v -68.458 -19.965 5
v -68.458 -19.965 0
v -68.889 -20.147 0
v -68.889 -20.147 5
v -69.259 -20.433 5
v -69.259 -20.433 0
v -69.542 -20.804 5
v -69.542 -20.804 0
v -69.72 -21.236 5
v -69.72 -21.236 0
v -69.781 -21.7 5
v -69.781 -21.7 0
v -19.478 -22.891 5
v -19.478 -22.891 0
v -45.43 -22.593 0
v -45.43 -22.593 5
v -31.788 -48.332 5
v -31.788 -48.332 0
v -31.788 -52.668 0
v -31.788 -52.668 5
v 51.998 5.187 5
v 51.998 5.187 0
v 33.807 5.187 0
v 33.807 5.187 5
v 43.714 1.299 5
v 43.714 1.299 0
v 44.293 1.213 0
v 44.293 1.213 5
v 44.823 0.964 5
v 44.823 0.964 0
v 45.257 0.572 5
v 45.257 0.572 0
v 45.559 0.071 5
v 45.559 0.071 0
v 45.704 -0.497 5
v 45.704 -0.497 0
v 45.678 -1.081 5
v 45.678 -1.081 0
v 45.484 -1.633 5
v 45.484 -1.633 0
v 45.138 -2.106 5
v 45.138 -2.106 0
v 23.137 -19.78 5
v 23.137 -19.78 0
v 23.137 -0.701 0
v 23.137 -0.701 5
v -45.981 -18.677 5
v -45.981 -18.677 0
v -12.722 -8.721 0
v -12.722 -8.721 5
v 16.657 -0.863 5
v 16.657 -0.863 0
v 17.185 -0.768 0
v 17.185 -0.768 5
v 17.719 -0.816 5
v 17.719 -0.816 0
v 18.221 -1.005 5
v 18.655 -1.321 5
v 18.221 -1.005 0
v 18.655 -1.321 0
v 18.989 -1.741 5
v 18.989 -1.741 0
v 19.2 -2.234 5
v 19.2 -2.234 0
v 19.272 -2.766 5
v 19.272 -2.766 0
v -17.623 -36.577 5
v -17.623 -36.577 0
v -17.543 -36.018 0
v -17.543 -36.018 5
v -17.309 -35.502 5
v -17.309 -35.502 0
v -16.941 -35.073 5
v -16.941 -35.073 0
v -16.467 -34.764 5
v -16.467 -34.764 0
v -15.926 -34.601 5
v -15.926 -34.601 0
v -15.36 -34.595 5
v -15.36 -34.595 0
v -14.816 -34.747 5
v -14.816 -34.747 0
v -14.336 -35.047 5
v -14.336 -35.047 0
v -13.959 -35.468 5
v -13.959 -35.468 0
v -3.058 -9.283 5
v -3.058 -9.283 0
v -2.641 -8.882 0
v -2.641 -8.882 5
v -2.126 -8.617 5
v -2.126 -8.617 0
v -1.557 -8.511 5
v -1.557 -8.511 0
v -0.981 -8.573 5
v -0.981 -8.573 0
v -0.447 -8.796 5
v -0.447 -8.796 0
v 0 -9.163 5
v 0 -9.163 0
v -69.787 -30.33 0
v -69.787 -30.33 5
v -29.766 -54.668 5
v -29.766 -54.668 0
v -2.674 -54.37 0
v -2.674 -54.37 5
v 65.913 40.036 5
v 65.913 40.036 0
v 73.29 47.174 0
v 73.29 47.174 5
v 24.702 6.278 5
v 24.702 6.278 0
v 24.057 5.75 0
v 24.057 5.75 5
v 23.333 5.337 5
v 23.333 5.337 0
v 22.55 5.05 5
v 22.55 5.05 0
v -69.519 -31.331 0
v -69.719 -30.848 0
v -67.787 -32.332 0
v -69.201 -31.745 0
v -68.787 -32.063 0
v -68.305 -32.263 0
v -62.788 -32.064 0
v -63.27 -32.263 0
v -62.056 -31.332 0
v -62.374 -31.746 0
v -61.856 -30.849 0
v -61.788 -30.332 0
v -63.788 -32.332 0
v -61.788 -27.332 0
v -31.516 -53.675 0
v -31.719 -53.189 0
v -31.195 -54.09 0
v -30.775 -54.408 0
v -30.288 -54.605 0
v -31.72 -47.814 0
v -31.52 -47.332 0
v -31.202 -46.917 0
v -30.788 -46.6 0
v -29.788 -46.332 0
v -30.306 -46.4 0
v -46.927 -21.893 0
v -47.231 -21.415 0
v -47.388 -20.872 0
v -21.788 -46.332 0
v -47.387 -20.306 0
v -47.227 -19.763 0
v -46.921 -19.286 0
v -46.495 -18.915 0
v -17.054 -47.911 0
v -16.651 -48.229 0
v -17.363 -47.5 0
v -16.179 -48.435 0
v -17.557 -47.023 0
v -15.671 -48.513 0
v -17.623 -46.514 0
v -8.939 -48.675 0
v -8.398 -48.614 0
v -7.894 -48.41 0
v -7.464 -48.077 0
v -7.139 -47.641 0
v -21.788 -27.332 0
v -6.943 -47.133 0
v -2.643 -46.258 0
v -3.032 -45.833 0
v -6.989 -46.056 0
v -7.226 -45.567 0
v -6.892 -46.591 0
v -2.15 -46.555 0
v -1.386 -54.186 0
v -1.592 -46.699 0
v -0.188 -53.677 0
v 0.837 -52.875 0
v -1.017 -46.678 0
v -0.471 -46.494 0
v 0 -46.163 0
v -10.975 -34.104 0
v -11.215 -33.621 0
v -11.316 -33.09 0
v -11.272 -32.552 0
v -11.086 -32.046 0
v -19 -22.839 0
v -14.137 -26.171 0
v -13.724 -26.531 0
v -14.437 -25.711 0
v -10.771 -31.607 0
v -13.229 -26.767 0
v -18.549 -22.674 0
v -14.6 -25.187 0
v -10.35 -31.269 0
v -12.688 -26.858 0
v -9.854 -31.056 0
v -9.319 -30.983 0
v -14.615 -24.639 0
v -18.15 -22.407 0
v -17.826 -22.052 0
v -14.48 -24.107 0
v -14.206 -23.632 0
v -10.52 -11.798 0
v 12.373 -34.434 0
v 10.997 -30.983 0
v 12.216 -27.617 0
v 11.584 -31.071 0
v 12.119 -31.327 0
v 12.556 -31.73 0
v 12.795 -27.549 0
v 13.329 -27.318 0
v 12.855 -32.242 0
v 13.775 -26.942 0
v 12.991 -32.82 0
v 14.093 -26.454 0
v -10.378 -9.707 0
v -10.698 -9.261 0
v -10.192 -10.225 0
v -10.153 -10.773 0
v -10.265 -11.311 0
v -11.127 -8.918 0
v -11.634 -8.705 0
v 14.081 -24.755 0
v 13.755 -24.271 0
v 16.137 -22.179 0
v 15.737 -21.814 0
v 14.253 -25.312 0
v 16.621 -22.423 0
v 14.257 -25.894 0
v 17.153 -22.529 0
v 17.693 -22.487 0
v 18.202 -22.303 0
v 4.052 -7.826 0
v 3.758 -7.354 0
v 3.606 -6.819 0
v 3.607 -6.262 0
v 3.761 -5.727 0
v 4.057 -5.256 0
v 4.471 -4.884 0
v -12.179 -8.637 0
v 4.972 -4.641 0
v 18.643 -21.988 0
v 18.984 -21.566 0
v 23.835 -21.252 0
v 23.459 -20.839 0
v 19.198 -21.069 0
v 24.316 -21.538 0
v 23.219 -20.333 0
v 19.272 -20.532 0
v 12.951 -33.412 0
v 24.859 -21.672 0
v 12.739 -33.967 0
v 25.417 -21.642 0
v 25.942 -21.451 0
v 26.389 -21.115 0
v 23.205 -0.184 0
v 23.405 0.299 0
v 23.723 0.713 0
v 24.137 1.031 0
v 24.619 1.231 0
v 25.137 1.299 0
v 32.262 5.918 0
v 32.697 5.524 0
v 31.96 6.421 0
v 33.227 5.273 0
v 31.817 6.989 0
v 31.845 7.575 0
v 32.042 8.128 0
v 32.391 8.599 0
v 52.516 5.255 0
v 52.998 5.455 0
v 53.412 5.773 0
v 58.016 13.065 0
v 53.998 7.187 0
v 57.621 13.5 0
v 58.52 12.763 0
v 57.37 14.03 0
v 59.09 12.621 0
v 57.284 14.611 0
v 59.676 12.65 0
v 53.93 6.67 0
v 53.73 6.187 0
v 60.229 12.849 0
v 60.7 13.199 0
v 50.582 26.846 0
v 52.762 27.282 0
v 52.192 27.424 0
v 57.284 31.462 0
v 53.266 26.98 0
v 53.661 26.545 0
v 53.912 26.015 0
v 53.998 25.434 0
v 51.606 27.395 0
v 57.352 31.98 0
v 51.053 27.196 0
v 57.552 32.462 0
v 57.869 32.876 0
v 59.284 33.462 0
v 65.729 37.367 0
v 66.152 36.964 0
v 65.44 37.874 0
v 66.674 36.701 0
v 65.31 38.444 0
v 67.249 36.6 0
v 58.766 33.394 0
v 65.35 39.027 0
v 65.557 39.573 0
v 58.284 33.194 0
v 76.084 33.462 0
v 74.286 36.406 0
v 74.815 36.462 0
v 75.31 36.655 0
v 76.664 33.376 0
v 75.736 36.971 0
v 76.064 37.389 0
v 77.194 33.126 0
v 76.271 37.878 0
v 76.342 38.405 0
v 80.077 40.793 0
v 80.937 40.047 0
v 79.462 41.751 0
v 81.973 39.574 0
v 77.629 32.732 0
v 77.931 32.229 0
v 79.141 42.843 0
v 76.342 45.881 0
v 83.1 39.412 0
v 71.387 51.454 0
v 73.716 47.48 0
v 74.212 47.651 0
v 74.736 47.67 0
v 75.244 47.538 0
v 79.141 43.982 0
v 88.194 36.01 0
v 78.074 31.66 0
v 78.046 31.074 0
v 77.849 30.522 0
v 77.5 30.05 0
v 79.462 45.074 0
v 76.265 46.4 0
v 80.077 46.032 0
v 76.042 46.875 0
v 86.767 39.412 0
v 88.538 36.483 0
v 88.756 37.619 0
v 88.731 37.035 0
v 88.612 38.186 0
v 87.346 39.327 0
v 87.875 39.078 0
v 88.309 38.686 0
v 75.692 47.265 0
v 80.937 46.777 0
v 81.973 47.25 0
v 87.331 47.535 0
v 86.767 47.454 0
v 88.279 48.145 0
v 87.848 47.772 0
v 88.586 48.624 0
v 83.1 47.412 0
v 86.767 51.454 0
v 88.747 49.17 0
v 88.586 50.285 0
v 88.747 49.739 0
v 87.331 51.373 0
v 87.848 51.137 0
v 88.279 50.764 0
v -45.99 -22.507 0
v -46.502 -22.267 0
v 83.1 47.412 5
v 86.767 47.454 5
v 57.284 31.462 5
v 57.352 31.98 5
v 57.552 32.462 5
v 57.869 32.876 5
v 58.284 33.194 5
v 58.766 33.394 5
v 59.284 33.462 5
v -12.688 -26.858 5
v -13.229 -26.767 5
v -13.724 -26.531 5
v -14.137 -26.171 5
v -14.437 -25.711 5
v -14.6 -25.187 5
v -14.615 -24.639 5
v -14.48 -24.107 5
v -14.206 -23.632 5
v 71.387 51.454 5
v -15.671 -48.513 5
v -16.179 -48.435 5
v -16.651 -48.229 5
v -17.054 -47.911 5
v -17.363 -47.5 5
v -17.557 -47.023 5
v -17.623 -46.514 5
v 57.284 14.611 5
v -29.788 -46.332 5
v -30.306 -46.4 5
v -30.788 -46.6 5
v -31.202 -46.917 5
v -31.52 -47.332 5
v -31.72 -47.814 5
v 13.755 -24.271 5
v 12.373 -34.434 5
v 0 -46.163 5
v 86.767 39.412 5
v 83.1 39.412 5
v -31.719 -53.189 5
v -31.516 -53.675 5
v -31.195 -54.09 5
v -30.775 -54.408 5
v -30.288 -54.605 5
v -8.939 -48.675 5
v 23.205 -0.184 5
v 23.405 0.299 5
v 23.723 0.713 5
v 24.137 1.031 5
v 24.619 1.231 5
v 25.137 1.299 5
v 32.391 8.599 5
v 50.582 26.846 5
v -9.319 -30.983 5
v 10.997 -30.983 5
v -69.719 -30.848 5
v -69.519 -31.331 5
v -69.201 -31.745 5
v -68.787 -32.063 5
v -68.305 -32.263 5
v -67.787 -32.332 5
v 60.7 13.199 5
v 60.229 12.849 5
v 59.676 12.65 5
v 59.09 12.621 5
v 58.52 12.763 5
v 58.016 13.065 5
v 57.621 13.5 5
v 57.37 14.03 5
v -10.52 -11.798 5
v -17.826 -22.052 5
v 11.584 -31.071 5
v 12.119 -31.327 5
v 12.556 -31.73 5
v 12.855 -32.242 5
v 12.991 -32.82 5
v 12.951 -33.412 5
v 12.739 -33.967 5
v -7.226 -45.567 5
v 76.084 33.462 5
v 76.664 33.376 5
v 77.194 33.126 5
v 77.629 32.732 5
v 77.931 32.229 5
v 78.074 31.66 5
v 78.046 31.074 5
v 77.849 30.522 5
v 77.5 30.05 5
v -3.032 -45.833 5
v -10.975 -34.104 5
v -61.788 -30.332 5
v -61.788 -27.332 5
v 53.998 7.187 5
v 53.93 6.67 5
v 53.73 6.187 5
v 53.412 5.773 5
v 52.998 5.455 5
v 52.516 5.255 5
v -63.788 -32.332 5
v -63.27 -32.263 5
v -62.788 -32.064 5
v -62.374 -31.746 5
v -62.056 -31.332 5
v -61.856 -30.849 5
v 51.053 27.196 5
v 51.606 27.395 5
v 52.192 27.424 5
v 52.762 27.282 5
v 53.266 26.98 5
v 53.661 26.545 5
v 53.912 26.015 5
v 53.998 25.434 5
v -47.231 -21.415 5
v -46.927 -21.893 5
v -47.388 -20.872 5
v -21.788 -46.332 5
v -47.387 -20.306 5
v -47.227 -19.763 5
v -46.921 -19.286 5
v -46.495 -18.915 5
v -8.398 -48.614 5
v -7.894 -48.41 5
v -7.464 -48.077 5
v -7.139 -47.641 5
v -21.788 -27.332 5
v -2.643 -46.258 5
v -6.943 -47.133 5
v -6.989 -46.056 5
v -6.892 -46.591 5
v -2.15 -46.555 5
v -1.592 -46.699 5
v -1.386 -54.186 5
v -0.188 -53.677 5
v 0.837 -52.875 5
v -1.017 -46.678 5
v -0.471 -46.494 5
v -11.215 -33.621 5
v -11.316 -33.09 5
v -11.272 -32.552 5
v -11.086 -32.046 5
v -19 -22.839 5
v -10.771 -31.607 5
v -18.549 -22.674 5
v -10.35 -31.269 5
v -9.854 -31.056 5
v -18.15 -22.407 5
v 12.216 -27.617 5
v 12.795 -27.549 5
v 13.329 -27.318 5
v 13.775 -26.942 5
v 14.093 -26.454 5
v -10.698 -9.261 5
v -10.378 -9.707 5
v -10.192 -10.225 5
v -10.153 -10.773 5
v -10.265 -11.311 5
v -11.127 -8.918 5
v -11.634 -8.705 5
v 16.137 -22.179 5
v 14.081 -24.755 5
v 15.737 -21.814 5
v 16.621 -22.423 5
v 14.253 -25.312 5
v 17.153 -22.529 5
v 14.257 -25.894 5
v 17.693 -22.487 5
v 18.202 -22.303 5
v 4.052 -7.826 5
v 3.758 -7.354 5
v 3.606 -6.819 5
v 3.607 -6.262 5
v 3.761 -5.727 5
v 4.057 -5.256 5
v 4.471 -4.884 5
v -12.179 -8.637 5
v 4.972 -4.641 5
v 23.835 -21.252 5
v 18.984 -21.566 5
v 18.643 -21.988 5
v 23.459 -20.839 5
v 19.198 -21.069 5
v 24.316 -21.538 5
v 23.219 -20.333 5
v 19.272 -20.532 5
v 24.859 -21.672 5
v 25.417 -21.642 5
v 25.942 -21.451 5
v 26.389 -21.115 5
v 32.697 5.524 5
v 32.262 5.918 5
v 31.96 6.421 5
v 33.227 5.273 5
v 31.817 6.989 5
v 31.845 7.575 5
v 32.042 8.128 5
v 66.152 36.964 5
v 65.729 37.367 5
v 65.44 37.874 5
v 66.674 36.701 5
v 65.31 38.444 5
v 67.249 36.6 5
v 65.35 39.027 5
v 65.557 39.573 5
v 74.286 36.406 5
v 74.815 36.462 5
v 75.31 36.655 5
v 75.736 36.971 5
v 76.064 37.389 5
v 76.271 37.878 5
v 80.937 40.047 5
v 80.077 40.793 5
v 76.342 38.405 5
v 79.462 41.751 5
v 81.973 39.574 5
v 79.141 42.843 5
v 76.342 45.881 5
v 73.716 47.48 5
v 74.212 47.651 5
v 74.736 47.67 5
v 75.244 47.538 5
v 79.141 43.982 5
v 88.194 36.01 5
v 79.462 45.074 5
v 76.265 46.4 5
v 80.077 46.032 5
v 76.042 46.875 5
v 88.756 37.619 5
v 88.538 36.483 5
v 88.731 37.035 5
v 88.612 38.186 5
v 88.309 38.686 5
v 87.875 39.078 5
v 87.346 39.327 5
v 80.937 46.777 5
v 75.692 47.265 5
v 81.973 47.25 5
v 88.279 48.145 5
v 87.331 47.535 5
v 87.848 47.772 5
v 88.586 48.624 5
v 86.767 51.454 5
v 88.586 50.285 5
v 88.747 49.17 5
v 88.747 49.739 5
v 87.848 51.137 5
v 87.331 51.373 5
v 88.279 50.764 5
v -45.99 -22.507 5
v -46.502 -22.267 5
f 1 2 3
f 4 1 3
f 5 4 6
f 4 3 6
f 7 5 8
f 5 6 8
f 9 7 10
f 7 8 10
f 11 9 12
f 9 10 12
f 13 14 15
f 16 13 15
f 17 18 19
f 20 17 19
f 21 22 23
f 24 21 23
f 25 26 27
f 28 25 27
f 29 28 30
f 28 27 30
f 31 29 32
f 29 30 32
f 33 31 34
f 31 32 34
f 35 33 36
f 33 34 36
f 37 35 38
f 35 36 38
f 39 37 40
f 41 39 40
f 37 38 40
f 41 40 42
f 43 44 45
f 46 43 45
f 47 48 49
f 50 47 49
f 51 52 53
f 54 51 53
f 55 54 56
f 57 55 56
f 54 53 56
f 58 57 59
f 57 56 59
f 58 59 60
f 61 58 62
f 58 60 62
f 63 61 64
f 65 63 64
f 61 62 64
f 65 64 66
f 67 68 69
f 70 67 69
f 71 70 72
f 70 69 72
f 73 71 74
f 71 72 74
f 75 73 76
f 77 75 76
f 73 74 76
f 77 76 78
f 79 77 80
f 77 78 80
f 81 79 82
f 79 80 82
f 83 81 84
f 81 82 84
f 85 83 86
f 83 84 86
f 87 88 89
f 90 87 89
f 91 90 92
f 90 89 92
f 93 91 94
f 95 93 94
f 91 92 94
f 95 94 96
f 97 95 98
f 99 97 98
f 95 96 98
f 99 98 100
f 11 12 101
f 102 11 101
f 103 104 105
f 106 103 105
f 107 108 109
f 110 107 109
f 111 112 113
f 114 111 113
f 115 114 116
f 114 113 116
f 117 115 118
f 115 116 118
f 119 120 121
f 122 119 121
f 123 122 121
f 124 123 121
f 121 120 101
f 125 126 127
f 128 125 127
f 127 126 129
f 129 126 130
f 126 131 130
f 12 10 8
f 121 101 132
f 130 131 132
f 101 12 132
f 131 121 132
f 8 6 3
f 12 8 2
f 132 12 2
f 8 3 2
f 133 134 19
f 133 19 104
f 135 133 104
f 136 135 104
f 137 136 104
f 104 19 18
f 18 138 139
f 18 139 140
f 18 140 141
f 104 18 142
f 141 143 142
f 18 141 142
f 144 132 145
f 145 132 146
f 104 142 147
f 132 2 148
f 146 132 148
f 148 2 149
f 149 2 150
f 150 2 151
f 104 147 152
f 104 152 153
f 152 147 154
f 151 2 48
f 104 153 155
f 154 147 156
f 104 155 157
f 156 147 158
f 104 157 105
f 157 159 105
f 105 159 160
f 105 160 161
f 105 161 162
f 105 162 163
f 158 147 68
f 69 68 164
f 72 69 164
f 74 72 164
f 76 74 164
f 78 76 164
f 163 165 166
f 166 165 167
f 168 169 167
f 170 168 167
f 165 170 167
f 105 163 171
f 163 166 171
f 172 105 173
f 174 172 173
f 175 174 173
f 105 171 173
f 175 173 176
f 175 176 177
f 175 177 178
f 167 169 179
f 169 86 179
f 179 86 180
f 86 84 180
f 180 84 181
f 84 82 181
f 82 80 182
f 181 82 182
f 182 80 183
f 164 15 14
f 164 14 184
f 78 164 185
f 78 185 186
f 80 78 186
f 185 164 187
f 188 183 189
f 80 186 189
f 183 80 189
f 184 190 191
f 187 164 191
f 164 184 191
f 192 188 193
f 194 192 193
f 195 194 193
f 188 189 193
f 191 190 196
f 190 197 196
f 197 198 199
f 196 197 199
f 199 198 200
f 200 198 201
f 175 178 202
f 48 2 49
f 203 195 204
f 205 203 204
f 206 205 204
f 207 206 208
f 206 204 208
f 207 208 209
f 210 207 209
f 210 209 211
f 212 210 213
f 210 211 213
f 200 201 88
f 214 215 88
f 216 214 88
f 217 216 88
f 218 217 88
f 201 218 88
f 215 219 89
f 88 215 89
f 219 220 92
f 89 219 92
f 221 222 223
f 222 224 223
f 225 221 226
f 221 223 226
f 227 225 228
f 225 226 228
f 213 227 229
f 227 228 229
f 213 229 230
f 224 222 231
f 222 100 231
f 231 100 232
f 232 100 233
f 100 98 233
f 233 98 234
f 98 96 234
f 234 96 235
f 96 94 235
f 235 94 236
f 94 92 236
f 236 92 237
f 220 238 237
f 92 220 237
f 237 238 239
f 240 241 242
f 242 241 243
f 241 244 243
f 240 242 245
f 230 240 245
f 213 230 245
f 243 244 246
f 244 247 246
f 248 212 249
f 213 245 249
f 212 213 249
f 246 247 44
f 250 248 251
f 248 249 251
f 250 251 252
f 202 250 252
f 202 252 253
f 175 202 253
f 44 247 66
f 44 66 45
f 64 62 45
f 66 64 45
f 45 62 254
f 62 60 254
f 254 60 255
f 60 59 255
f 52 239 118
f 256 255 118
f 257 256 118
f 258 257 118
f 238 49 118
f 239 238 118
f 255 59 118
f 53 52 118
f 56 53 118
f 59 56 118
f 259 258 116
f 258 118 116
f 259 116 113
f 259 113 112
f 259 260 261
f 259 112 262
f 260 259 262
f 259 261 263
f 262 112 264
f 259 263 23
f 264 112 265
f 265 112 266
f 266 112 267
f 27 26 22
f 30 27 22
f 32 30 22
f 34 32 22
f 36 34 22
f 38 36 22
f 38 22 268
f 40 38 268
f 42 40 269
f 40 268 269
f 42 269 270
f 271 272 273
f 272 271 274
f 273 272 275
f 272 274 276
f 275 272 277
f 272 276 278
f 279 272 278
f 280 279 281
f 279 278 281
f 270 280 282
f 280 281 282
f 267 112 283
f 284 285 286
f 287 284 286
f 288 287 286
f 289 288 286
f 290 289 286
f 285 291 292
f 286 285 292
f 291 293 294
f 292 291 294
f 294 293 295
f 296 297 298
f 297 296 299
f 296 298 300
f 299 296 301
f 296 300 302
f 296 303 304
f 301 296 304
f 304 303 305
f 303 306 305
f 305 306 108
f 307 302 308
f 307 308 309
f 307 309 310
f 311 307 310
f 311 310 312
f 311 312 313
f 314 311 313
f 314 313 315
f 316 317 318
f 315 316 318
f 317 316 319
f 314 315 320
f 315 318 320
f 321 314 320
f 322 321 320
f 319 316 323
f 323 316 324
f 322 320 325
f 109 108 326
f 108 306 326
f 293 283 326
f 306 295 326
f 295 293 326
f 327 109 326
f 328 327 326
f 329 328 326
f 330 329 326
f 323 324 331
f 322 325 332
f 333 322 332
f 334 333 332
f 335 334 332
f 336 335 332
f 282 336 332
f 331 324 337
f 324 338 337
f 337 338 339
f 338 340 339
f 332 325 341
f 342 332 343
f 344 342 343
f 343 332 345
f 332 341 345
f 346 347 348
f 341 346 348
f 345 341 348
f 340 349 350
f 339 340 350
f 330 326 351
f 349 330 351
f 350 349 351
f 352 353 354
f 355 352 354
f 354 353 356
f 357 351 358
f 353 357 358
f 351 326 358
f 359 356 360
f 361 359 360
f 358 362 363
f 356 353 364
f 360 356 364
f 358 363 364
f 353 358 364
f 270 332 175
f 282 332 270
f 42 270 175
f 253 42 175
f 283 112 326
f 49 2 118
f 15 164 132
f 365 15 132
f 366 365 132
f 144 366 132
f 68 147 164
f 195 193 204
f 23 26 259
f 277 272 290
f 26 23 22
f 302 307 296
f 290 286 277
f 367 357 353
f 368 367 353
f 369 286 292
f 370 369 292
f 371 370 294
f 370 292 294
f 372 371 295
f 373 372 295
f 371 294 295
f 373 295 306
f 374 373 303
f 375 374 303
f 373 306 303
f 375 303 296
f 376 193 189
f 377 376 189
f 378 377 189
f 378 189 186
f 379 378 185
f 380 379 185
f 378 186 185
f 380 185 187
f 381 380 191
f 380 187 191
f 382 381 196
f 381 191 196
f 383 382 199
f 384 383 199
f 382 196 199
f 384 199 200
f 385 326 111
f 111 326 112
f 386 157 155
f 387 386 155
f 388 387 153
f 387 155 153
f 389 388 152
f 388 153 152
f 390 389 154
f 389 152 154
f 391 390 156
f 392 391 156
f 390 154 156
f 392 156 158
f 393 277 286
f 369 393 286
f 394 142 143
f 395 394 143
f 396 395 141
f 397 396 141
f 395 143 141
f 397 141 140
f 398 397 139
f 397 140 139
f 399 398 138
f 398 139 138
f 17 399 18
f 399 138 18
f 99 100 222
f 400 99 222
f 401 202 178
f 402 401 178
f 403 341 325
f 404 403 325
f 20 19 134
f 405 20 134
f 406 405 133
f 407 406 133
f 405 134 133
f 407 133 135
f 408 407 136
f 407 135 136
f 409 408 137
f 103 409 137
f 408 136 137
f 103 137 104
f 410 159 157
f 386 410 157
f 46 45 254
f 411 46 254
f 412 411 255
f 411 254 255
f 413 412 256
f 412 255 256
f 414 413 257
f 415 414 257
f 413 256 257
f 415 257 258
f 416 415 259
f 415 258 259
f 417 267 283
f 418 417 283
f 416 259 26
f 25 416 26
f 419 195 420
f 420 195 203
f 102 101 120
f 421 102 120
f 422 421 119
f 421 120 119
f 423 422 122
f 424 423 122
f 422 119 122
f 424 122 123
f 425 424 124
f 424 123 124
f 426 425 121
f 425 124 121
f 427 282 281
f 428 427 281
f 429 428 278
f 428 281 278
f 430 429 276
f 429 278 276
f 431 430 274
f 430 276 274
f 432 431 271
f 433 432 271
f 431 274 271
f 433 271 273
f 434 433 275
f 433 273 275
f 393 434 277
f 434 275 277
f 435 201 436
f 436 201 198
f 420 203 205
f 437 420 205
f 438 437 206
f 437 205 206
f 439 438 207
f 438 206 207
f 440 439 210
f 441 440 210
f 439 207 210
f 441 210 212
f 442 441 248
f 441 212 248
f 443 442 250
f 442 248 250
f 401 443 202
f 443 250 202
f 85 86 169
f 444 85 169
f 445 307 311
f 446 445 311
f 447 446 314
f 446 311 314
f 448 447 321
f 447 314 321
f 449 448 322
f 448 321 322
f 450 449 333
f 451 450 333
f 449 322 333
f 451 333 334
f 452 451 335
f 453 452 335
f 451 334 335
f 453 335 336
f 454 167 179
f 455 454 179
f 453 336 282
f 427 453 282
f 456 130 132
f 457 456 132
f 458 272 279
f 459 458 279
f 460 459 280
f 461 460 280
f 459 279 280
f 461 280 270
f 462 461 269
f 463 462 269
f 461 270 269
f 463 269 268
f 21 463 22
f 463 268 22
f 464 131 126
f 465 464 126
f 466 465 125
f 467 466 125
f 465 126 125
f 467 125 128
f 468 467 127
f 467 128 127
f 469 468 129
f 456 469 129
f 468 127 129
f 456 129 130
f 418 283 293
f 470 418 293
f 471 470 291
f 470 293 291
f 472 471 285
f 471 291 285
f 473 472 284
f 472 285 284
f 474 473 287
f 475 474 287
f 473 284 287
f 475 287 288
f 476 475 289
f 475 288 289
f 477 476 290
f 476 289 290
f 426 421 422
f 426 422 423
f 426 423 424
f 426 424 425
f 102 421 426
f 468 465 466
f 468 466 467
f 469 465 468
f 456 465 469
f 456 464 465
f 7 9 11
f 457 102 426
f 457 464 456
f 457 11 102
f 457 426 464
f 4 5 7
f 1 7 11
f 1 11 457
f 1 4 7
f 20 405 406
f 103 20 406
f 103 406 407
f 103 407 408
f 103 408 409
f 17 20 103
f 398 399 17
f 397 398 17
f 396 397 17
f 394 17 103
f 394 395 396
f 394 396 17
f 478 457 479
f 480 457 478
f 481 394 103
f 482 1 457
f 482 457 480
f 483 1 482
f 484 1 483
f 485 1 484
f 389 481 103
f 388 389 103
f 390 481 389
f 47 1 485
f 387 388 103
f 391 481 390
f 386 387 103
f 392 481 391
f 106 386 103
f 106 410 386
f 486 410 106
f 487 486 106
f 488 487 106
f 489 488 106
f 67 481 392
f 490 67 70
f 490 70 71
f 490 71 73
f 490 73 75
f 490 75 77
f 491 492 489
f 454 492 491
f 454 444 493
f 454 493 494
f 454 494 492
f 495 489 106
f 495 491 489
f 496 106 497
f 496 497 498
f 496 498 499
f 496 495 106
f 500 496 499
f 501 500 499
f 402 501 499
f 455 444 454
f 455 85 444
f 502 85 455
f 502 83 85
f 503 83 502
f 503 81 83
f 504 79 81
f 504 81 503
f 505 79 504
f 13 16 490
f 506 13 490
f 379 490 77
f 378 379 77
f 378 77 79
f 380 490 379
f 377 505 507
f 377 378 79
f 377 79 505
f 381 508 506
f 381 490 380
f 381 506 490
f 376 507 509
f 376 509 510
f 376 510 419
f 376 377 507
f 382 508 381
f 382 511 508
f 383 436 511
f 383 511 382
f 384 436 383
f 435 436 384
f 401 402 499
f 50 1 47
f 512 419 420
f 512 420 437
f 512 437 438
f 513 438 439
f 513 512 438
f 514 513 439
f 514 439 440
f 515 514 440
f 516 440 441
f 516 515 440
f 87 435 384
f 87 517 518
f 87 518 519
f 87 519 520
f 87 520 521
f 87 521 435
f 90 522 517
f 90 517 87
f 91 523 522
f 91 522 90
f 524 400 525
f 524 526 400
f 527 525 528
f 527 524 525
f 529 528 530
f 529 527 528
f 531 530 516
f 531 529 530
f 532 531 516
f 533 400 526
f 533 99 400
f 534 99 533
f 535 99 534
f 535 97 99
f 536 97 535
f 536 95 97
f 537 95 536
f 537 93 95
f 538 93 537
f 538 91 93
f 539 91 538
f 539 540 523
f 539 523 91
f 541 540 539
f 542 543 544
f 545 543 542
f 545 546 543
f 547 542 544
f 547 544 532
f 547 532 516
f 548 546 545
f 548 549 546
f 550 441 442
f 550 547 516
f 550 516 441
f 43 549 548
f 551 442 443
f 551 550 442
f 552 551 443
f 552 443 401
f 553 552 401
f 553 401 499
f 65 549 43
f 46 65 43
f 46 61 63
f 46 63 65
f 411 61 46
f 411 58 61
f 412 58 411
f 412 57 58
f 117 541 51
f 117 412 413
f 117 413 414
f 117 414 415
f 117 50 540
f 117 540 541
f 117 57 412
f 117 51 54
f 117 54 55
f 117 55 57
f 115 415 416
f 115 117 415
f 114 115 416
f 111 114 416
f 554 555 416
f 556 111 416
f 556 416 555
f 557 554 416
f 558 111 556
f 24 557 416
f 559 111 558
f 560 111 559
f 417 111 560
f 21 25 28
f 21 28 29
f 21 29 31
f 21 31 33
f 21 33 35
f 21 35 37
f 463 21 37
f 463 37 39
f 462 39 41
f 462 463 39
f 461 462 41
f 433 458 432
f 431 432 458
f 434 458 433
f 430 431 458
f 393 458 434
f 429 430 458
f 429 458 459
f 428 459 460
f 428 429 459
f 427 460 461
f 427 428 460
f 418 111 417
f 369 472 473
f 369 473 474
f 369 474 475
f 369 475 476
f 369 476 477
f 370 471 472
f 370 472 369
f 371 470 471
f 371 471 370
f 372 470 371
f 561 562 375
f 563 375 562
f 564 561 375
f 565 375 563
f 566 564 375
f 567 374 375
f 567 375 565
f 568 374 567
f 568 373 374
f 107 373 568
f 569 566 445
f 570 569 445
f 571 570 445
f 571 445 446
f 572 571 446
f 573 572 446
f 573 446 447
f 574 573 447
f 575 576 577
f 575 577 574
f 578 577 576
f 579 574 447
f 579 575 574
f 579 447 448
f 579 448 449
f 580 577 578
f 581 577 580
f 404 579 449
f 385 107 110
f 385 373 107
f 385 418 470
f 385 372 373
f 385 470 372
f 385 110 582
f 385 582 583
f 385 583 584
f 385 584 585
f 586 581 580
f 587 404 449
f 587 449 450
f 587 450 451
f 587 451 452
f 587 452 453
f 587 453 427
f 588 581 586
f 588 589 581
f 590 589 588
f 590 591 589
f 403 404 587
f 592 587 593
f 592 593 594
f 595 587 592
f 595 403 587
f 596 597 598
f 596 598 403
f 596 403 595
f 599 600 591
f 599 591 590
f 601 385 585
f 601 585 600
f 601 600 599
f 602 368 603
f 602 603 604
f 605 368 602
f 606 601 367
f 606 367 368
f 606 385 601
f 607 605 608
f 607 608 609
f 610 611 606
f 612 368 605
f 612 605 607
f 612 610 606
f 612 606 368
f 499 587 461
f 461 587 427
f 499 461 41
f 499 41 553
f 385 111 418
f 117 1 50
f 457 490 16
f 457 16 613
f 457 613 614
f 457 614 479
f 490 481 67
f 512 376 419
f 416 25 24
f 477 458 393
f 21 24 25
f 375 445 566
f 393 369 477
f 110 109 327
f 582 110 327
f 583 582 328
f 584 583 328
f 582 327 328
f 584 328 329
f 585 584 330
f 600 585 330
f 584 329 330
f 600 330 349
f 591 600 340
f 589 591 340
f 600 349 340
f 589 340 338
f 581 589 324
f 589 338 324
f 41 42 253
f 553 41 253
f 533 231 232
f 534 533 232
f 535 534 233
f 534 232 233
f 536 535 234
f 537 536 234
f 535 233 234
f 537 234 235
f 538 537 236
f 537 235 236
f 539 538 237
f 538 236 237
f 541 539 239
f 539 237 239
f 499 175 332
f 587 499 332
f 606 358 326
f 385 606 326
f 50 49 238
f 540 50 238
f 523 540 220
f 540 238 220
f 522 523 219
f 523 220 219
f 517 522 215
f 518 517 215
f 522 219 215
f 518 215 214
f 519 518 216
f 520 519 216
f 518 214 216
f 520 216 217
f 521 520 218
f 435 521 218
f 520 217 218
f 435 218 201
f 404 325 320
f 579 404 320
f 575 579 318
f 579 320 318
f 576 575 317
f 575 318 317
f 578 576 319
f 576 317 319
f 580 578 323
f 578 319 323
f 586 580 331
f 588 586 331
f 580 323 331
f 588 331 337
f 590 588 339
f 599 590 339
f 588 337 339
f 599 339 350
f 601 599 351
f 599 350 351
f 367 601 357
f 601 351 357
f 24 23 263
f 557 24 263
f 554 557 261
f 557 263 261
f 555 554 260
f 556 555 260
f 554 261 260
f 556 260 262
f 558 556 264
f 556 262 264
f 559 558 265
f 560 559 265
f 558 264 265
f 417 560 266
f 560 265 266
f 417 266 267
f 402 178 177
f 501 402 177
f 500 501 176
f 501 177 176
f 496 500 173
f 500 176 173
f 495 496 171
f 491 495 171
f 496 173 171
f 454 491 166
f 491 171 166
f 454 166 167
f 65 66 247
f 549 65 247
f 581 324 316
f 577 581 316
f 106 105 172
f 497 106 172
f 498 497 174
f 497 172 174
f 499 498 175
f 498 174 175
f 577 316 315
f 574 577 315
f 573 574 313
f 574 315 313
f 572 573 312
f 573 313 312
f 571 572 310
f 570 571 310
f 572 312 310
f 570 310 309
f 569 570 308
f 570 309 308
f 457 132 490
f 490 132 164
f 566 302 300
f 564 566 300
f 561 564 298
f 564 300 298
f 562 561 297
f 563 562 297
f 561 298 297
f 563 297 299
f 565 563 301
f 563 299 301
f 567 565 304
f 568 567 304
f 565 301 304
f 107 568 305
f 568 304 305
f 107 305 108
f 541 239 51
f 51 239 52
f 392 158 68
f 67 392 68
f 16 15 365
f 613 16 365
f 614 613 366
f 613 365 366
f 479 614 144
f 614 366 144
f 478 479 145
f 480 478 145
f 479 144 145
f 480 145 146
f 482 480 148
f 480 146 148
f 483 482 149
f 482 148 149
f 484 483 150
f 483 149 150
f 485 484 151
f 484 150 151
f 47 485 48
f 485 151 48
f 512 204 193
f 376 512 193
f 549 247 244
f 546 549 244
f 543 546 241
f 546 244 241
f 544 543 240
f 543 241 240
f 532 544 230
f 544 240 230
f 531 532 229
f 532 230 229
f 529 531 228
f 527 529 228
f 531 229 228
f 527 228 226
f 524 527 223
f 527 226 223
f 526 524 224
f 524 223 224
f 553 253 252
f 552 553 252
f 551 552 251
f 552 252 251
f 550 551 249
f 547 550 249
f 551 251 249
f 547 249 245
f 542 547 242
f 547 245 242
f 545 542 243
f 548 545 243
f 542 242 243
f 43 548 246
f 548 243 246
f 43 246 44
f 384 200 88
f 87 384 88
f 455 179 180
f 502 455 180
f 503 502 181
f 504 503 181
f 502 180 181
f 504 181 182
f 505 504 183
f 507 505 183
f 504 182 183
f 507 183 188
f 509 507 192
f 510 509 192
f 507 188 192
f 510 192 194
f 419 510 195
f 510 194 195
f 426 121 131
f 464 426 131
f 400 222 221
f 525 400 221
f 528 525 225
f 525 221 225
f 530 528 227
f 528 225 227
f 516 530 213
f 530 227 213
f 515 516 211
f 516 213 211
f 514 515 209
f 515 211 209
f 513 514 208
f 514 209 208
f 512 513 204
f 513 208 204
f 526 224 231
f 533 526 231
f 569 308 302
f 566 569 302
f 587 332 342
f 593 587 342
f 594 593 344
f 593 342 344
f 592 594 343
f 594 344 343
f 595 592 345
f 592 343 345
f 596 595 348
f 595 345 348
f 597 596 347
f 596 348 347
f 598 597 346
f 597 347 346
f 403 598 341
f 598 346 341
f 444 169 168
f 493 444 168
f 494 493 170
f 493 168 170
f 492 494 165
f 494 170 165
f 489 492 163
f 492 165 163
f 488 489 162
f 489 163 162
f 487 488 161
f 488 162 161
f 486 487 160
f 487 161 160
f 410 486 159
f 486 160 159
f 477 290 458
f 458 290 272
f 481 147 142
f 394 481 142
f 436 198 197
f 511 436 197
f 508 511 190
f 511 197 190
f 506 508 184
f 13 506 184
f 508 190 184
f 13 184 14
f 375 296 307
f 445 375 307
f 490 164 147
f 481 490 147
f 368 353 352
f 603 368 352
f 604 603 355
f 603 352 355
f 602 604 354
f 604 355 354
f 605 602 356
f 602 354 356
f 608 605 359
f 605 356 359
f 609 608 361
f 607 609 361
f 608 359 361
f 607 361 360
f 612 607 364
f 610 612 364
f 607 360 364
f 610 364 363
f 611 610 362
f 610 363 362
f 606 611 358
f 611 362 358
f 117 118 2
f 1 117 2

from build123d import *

# Parameters (mm, degrees)
F1_DEPTH = 5


with BuildPart() as f1:
    # F0 (on Top) → F1 (new body)
    with BuildSketch(Plane.XY):
        with BuildLine():
            ThreePointArc((-2.674113, -54.37004), (-0.770343, -53.970695), (0.836963, -52.875074))
            Line((0.836963, -52.875074), (88.193572, 36.010466))
            ThreePointArc((88.193572, 36.010466), (88.611566, 38.185732), (86.767144, 39.412358))
            Line((86.767144, 39.412358), (83.100055, 39.412358))
            ThreePointArc((83.100055, 39.412358), (79.100055, 43.412358), (83.100055, 47.412358))
            Line((83.100055, 47.412358), (86.767144, 47.454403))
            ThreePointArc((86.767144, 47.454403), (88.767144, 49.454403), (86.767144, 51.454403))
            Line((86.767144, 51.454403), (71.387003, 51.454403))
            Line((71.387003, 51.454403), (24.701984, 6.277601))
            ThreePointArc((24.701984, 6.277601), (23.703334, 5.528153), (22.550135, 5.049502))
            Line((22.550135, 5.049502), (-68.458309, -19.965363))
            ThreePointArc((-68.458309, -19.965363), (-69.412453, -20.609364), (-69.781248, -21.699831))
            Line((-69.781248, -21.699831), (-69.786822, -30.330341))
            ThreePointArc((-69.786822, -30.330341), (-69.201493, -31.74539), (-67.786822, -32.331633))
            Line((-67.786822, -32.331633), (-63.788114, -32.331633))
            ThreePointArc((-63.788114, -32.331633), (-62.373901, -31.745846), (-61.788114, -30.331633))
            Line((-61.788114, -30.331633), (-61.788114, -27.331633))
            Line((-61.788114, -27.331633), (-21.788114, -27.331633))
            Line((-21.788114, -27.331633), (-21.788114, -46.331633))
            Line((-21.788114, -46.331633), (-29.788114, -46.331633))
            ThreePointArc((-29.788114, -46.331633), (-31.202328, -46.917419), (-31.788114, -48.331633))
            Line((-31.788114, -48.331633), (-31.788114, -52.668167))
            ThreePointArc((-31.788114, -52.668167), (-31.194529, -54.090137), (-29.766116, -54.668046))
            Line((-29.766116, -54.668046), (-2.674113, -54.37004))
        make_face()
        with BuildLine():
            Line((-13.958797, -35.468011), (-7.226438, -45.566549))
            ThreePointArc((-7.226438, -45.566549), (-7.138692, -47.640851), (-8.938748, -48.675368))
            Line((-8.938748, -48.675368), (-15.671107, -48.513038))
            ThreePointArc((-15.671107, -48.513038), (-17.054054, -47.910684), (-17.622897, -46.513619))
            Line((-17.622897, -46.513619), (-17.622897, -36.577411))
            ThreePointArc((-17.622897, -36.577411), (-16.202466, -34.663227), (-13.958797, -35.468011))
        make_face(mode=Mode.SUBTRACT)
        with BuildLine():
            ThreePointArc((-10.975061, -34.104397), (-11.085903, -32.045596), (-9.319116, -30.982859))
            Line((-9.319116, -30.982859), (10.997215, -30.982859))
            ThreePointArc((10.997215, -30.982859), (12.855047, -32.242277), (12.373093, -34.434397))
            Line((12.373093, -34.434397), (0, -46.162553))
            ThreePointArc((0, -46.162553), (-1.59229, -46.699272), (-3.031822, -45.832553))
            Line((-3.031822, -45.832553), (-10.975061, -34.104397))
        make_face(mode=Mode.SUBTRACT)
        with BuildLine():
            Line((-10.519725, -11.797756), (-17.826055, -22.051859))
            ThreePointArc((-17.826055, -22.051859), (-18.5489, -22.674313), (-19.477843, -22.891148))
            Line((-19.477843, -22.891148), (-45.430275, -22.593101))
            ThreePointArc((-45.430275, -22.593101), (-47.387827, -20.871703), (-45.980863, -18.677238))
            Line((-45.980863, -18.677238), (-12.722101, -8.721183))
            ThreePointArc((-12.722101, -8.721183), (-10.522285, -9.473013), (-10.519725, -11.797756))
        make_face(mode=Mode.SUBTRACT)
        with BuildLine():
            Line((12.215566, -27.616652), (-12.687871, -26.858329))
            ThreePointArc((-12.687871, -26.858329), (-14.436563, -25.711004), (-14.206369, -23.632232))
            Line((-14.206369, -23.632232), (-3.058227, -9.282833))
            ThreePointArc((-3.058227, -9.282833), (-1.556912, -8.511381), (0, -9.163386))
            Line((0, -9.163386), (13.755295, -24.271108))
            ThreePointArc((13.755295, -24.271108), (14.093259, -26.453739), (12.215566, -27.616652))
        make_face(mode=Mode.SUBTRACT)
        with BuildLine():
            Line((19.271857, -2.765768), (19.271857, -20.532251))
            ThreePointArc((19.271857, -20.532251), (17.953823, -22.41239), (15.736935, -21.814441))
            Line((15.736935, -21.814441), (4.052052, -7.826359))
            ThreePointArc((4.052052, -7.826359), (3.665453, -5.989415), (4.97163, -4.641184))
            Line((4.97163, -4.641184), (16.656512, -0.862783))
            ThreePointArc((16.656512, -0.862783), (18.448571, -1.148565), (19.271857, -2.765768))
        make_face(mode=Mode.SUBTRACT)
        with BuildLine():
            Line((25.136737, 1.298854), (43.714296, 1.298854))
            ThreePointArc((43.714296, 1.298854), (45.559407, 0.070584), (45.138224, -2.105579))
            Line((45.138224, -2.105579), (26.389468, -21.114586))
            ThreePointArc((26.389468, -21.114586), (24.315692, -21.538242), (23.136737, -19.780375))
            Line((23.136737, -19.780375), (23.136737, -0.701146))
            ThreePointArc((23.136737, -0.701146), (23.722523, 0.713067), (25.136737, 1.298854))
        make_face(mode=Mode.SUBTRACT)
        with BuildLine():
            ThreePointArc((53.998229, 7.187327), (53.412442, 5.773113), (51.998229, 5.187327))
            Line((51.998229, 5.187327), (33.807475, 5.187327))
            ThreePointArc((33.807475, 5.187327), (31.9603, 6.42055), (32.391104, 8.59938))
            Line((32.391104, 8.59938), (50.581858, 26.845761))
            ThreePointArc((50.581858, 26.845761), (52.762185, 27.282051), (53.998229, 25.433708))
            Line((53.998229, 25.433708), (53.998229, 7.187327))
        make_face(mode=Mode.SUBTRACT)
        with BuildLine():
            Line((59.283667, 33.462164), (76.083784, 33.462164))
            ThreePointArc((76.083784, 33.462164), (77.930966, 32.228923), (77.500126, 30.050083))
            Line((77.500126, 30.050083), (60.700009, 13.199277))
            ThreePointArc((60.700009, 13.199277), (58.519692, 12.763024), (57.283667, 14.611359))
            Line((57.283667, 14.611359), (57.283667, 31.462164))
            ThreePointArc((57.283667, 31.462164), (57.869453, 32.876378), (59.283667, 33.462164))
        make_face(mode=Mode.SUBTRACT)
        with BuildLine():
            Line((76.341538, 45.880931), (76.341538, 38.404973))
            ThreePointArc((76.341538, 38.404973), (75.736125, 36.971401), (74.28641, 36.405733))
            Line((74.28641, 36.405733), (67.249003, 36.599787))
            ThreePointArc((67.249003, 36.599787), (65.439989, 37.874478), (65.913325, 40.036266))
            Line((65.913325, 40.036266), (73.289812, 47.174446))
            ThreePointArc((73.289812, 47.174446), (75.243995, 47.538204), (76.341538, 45.880931))
        make_face(mode=Mode.SUBTRACT)
    extrude(amount=F1_DEPTH)


solid = f1.part
